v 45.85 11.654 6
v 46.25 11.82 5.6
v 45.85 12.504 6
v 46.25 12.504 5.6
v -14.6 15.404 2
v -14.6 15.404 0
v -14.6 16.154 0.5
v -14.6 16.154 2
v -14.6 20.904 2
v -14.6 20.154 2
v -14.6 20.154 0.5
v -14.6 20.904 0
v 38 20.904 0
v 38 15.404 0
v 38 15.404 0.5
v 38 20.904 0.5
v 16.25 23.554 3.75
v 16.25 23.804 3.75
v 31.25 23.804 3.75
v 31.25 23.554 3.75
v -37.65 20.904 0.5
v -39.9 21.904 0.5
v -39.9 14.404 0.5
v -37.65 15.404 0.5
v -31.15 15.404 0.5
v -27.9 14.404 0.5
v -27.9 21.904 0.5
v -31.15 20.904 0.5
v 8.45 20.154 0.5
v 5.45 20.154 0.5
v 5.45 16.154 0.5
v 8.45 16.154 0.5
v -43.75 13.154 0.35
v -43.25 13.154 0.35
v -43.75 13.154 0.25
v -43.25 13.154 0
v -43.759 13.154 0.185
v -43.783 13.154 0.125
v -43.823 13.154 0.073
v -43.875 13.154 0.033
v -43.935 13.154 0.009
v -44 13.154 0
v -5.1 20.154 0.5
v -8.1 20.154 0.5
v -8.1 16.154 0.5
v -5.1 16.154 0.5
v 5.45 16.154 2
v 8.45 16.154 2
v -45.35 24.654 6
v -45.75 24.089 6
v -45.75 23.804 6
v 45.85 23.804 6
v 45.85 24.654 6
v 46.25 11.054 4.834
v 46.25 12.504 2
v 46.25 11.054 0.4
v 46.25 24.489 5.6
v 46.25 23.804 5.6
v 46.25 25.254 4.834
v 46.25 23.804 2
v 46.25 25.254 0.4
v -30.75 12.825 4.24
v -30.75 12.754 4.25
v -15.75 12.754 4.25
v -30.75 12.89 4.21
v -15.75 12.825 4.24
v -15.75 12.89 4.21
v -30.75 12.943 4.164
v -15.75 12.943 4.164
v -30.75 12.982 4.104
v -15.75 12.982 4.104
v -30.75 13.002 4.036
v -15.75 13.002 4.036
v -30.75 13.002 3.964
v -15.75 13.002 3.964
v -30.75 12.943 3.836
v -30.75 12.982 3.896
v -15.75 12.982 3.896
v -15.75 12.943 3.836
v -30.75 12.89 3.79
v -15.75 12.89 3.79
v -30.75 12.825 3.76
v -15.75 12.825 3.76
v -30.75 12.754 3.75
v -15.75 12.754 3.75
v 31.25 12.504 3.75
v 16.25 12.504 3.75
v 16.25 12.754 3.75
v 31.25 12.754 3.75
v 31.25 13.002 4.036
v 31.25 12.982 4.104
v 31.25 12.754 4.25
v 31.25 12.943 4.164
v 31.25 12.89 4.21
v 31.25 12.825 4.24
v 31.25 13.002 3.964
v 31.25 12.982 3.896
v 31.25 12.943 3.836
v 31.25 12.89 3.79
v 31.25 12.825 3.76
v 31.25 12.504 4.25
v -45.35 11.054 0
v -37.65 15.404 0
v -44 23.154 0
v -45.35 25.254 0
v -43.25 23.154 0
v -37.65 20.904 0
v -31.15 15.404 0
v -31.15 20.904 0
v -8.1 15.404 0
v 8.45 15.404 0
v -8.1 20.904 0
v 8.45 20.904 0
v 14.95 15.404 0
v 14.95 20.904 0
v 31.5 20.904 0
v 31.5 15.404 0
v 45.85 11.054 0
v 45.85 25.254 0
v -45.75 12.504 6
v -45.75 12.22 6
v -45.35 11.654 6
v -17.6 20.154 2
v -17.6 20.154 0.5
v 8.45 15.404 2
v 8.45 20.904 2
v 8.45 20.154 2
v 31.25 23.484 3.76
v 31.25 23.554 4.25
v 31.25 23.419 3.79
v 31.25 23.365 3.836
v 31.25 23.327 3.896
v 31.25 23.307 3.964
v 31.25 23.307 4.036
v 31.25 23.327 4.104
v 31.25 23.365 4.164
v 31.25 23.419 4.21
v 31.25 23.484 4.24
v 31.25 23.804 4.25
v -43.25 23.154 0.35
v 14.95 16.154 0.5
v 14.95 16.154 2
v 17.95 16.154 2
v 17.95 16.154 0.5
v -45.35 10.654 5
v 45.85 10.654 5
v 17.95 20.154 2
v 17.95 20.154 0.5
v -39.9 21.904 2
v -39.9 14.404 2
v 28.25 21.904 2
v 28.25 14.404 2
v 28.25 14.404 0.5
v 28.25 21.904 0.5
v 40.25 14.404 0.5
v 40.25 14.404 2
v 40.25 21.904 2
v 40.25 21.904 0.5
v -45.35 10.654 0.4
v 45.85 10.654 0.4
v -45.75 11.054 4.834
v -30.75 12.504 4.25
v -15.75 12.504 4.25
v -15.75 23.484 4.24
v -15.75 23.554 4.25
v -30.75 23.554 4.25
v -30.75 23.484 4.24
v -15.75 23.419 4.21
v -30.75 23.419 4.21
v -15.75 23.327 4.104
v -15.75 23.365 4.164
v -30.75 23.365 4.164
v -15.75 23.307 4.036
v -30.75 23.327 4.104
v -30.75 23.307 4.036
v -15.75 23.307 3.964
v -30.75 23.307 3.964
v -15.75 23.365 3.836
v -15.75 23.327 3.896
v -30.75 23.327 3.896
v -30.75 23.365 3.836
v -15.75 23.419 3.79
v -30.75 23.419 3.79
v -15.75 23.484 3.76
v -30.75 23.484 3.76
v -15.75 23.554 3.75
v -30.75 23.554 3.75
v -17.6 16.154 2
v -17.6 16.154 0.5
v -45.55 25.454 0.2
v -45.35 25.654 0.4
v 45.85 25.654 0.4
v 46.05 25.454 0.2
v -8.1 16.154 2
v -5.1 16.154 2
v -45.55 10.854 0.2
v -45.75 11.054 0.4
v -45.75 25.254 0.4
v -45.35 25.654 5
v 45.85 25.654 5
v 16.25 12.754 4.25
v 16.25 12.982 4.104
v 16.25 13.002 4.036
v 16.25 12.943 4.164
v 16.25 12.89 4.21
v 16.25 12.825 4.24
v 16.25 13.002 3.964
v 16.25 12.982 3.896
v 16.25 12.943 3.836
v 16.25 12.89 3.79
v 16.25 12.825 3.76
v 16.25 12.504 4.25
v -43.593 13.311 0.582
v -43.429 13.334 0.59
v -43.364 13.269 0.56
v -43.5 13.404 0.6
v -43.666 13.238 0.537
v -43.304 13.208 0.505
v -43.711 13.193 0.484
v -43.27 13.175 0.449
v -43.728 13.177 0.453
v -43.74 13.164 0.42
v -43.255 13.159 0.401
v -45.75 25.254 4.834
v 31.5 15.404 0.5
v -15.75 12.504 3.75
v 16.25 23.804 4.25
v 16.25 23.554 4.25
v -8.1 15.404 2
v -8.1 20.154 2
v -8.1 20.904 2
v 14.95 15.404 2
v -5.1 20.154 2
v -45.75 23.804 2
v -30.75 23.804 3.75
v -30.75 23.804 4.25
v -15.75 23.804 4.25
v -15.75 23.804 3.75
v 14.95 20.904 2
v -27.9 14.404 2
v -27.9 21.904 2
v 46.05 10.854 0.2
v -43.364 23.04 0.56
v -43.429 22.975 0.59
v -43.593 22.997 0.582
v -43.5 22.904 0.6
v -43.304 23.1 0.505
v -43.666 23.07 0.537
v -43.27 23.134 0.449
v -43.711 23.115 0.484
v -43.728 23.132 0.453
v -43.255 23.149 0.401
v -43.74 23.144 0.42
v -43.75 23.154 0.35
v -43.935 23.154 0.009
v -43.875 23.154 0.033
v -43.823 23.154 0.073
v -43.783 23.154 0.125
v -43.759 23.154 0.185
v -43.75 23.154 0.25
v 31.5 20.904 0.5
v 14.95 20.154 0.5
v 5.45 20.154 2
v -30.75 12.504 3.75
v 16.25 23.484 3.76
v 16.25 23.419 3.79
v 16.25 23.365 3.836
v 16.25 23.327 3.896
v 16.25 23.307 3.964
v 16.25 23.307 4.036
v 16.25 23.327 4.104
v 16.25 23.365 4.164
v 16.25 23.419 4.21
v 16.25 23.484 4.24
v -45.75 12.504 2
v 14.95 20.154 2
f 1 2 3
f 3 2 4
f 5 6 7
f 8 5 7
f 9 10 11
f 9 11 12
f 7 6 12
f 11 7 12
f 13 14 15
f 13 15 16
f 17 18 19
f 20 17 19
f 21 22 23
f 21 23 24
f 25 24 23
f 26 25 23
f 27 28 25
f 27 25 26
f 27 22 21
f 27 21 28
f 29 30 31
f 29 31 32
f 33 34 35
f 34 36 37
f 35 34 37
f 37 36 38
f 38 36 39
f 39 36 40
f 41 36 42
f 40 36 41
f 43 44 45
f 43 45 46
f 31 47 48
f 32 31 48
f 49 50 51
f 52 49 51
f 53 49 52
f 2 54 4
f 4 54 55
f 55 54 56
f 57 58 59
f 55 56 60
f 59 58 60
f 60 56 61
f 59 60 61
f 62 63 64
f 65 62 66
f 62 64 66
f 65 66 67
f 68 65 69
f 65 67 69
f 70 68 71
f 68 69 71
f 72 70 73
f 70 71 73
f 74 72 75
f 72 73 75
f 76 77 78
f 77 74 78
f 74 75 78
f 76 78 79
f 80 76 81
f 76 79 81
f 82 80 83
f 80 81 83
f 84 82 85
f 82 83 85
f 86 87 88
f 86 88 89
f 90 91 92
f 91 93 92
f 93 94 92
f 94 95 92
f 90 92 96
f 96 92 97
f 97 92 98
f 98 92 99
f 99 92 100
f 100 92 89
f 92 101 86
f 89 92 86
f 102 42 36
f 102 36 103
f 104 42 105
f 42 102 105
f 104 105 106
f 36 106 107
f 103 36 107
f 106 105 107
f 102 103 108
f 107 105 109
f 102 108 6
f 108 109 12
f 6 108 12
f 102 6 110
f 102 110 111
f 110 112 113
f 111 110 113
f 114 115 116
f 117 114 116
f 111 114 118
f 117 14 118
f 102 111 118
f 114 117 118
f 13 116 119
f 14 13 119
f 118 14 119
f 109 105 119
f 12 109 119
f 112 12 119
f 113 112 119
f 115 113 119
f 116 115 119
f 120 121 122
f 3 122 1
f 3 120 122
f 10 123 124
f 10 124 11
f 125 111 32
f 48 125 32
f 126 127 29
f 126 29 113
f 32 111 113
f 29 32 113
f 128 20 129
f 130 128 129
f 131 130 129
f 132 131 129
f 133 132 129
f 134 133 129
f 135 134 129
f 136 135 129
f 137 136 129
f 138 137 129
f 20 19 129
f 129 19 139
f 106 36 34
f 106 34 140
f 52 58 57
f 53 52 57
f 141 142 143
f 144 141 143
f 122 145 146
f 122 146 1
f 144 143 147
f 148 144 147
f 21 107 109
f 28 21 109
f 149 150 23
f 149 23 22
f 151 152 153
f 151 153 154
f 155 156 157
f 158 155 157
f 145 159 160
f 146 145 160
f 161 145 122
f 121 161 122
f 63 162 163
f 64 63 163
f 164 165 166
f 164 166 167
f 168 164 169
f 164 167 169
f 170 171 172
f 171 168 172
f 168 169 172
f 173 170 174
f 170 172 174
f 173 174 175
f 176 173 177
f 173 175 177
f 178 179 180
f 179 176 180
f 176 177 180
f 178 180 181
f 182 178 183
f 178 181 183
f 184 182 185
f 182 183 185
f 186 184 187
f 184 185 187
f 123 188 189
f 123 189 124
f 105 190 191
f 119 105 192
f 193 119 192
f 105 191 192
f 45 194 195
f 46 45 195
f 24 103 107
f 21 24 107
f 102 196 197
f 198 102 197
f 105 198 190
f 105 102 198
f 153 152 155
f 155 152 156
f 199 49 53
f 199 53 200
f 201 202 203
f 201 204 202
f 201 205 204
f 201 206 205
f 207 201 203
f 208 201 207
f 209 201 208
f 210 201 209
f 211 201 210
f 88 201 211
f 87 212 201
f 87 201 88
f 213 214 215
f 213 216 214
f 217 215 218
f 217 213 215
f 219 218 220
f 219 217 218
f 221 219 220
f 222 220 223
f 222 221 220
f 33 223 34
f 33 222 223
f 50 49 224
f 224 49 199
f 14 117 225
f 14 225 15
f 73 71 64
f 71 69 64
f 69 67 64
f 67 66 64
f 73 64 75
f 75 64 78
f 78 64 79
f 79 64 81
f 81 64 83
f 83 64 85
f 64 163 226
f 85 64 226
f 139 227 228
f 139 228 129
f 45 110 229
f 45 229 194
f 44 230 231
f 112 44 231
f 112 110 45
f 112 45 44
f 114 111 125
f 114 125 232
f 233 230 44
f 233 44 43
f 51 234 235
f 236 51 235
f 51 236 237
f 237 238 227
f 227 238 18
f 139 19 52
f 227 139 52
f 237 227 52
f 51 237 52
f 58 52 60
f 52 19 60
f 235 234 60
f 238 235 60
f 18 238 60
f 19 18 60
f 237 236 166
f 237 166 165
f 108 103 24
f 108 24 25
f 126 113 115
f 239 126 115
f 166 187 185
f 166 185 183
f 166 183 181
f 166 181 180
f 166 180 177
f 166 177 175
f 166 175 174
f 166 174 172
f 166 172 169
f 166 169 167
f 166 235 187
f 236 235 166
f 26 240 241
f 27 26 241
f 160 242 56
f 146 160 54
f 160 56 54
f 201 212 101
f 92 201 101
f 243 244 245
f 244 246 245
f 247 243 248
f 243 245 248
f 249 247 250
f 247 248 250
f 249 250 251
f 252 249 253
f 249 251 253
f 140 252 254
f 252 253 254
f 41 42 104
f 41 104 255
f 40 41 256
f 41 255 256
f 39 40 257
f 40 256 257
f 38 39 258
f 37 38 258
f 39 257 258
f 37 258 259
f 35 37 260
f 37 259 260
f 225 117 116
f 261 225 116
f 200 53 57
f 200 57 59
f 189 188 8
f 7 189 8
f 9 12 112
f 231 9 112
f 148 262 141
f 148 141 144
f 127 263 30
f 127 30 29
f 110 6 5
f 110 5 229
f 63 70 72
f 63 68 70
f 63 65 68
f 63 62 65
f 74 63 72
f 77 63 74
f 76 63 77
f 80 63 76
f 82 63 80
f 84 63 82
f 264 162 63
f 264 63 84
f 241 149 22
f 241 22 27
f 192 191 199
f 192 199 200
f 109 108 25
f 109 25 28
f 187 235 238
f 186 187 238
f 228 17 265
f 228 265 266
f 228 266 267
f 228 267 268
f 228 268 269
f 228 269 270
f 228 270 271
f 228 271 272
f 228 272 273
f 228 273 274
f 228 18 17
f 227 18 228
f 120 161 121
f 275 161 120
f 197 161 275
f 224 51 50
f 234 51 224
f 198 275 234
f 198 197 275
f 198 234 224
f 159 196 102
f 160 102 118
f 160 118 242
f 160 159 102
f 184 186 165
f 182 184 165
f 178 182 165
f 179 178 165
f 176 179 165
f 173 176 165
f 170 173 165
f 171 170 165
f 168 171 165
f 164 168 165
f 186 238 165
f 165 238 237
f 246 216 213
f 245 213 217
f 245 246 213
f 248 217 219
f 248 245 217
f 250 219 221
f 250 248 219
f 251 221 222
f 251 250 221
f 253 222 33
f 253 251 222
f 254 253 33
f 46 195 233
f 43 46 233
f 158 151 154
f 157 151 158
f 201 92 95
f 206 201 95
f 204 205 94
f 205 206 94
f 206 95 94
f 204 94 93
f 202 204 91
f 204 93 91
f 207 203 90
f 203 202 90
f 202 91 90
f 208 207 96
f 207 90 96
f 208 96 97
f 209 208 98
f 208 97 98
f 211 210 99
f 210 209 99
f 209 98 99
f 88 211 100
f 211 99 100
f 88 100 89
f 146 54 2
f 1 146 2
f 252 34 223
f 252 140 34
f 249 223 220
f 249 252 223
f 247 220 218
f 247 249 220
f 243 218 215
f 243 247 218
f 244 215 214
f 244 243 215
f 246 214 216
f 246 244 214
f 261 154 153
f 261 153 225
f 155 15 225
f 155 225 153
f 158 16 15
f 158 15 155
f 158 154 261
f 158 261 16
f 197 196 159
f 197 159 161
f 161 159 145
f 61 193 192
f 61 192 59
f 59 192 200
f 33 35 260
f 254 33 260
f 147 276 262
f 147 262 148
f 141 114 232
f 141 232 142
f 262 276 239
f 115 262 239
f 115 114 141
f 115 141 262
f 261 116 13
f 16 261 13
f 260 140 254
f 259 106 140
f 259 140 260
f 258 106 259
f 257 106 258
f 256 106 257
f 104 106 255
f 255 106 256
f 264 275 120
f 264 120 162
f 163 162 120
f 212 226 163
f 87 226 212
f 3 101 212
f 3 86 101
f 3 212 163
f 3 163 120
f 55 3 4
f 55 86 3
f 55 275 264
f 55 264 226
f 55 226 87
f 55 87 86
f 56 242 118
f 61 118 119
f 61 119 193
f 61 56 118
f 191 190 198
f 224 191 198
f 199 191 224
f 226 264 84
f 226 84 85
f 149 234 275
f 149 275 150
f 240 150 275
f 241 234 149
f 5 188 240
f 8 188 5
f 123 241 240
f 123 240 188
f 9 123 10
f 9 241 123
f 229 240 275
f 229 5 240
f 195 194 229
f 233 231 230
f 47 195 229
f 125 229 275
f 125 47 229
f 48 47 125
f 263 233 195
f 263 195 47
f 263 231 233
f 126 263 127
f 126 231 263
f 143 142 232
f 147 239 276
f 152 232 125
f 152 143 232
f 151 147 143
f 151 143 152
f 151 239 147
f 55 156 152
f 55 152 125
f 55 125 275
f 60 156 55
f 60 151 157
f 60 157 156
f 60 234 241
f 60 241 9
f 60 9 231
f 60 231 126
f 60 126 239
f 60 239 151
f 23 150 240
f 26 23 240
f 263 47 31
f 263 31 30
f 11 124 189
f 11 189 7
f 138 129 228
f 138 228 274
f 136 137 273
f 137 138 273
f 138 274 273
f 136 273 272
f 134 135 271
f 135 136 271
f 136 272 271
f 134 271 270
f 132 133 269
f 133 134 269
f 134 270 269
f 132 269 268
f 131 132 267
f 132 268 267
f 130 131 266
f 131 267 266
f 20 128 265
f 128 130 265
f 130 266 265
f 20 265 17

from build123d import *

# Parameters (mm, degrees)
SKETCH1_W               = 92
SKETCH1_H               = 15
BOSS_EXTRUDE1_DEPTH     = 6
CUT_EXTRUDE1_DEPTH      = 54.227863457
CUT_EXTRUDE1_DEPTH_BACK = 54.227863457
SKETCH2_W               = 6.5
SKETCH2_H               = 5.5
CUT_EXTRUDE2_DEPTH      = 54.227863457
CUT_EXTRUDE2_DEPTH_BACK = 54.227863457
SKETCH3_W               = 6.5
SKETCH3_H               = 5.5
CUT_EXTRUDE3_DEPTH      = 54.227863457
CUT_EXTRUDE3_DEPTH_BACK = 54.227863457
SKETCH4_W               = 6.5
SKETCH4_H               = 5.5
CUT_EXTRUDE4_DEPTH      = 54.227863457
CUT_EXTRUDE4_DEPTH_BACK = 54.227863457
SKETCH5_W               = 6.5
SKETCH5_H               = 5.5
CUT_EXTRUDE5_DEPTH      = 54.227863457
CUT_EXTRUDE5_DEPTH_BACK = 4
SKETCH8_W               = 92
SKETCH8_H               = 11.3
SKETCH9_W               = 12
SKETCH9_H               = 7.5
CUT_EXTRUDE6_DEPTH      = 1.5
SKETCH10_W              = 12.5
SKETCH10_H              = 4
CUT_EXTRUDE7_DEPTH      = 1.5
CUT_EXTRUDE8_DEPTH      = 92
SKETCH13_W              = 0.5
SKETCH13_H              = 10
CUT_EXTRUDE9_DEPTH      = 0.6
FILLET1_R               = 0.25
FILLET2_R               = 0.25
SKETCH16_W              = 15
SKETCH16_H              = 0.5
BOSS_EXTRUDE2_DEPTH     = 0.75
FILLET3_R               = 0.5
FILLET4_R               = 0.25
SKETCH17_W              = 15
SKETCH17_H              = 0.5
BOSS_EXTRUDE3_DEPTH     = 0.75
FILLET5_R               = 0.5
FILLET6_R               = 0.25
LPATTERN1_COUNT         = 2
LPATTERN1_PITCH         = 47
LPATTERN2_COUNT         = 2
LPATTERN2_PITCH         = 47
FILLET7_R               = 0.5
FILLET8_R               = 0.25
FILLET9_R               = 0.5
FILLET10_R              = 0.25
CHAMFER1_SIZE           = 0.4
CHAMFER2_SIZE           = 0.4
CHAMFER3_SIZE           = 0.4
CHAMFER4_SIZE           = 0.4
CHAMFER5_SIZE           = 0.4


# Some blends are built 0.0001 mm under size
with BuildPart() as part:
    # Sketch1 → Boss-Extrude1 (new body)
    with BuildSketch(Plane.XY):
        with Locations((0.25, 18.154296875)):
            Rectangle(SKETCH1_W, SKETCH1_H)
    extrude(amount=BOSS_EXTRUDE1_DEPTH)

    # Sketch2 → Cut-Extrude1 (cut, two sides: drawn at the far end of the back side and taken through both)
    with BuildSketch(Plane.XY.offset(6).offset(-CUT_EXTRUDE1_DEPTH_BACK)):
        with Locations((-34.4, 18.154296875)):
            Rectangle(SKETCH2_W, SKETCH2_H)
    extrude(amount=CUT_EXTRUDE1_DEPTH + CUT_EXTRUDE1_DEPTH_BACK, mode=Mode.SUBTRACT)

    # Sketch3 → Cut-Extrude2 (cut, two sides: drawn at the far end of the back side and taken through both)
    with BuildSketch(Plane.XY.offset(6).offset(-CUT_EXTRUDE2_DEPTH_BACK)):
        with Locations((-11.35, 18.154296875)):
            Rectangle(SKETCH3_W, SKETCH3_H)
    extrude(amount=CUT_EXTRUDE2_DEPTH + CUT_EXTRUDE2_DEPTH_BACK, mode=Mode.SUBTRACT)

    # Sketch4 → Cut-Extrude3 (cut, two sides: drawn at the far end of the back side and taken through both)
    with BuildSketch(Plane.XY.offset(6).offset(-CUT_EXTRUDE3_DEPTH_BACK)):
        with Locations((11.7, 18.154296875)):
            Rectangle(SKETCH4_W, SKETCH4_H)
    extrude(amount=CUT_EXTRUDE3_DEPTH + CUT_EXTRUDE3_DEPTH_BACK, mode=Mode.SUBTRACT)

    # Sketch5 → Cut-Extrude4 (cut, two sides: drawn at the far end of the back side and taken through both)
    with BuildSketch(Plane.XY.offset(6).offset(-CUT_EXTRUDE4_DEPTH_BACK)):
        with Locations((34.75, 18.154296875)):
            Rectangle(SKETCH5_W, SKETCH5_H)
    extrude(amount=CUT_EXTRUDE4_DEPTH + CUT_EXTRUDE4_DEPTH_BACK, mode=Mode.SUBTRACT)

    # Sketch8 → Cut-Extrude5 (cut, two sides: drawn at the far end of the back side and taken through both)
    with BuildSketch(Plane.XY.offset(6).offset(-CUT_EXTRUDE5_DEPTH_BACK)):
        with Locations((0.25, 18.154296875)):
            Rectangle(SKETCH8_W, SKETCH8_H)
    extrude(amount=CUT_EXTRUDE5_DEPTH + CUT_EXTRUDE5_DEPTH_BACK, mode=Mode.SUBTRACT)

    # Sketch9 → Cut-Extrude6 (cut)
    with BuildSketch(Plane.XY.offset(2)):
        with Locations((34.25, 18.154296875)):
            Rectangle(SKETCH9_W, SKETCH9_H)
        with Locations((-33.9, 18.154296875)):
            Rectangle(SKETCH9_W, SKETCH9_H)
    extrude(amount=-CUT_EXTRUDE6_DEPTH, mode=Mode.SUBTRACT)

    # Sketch10 → Cut-Extrude7 (cut)
    with BuildSketch(Plane.XY.offset(2)):
        with Locations((11.7, 18.154296875)):
            Rectangle(SKETCH10_W, SKETCH10_H)
        with Locations((-11.35, 18.154296875)):
            Rectangle(SKETCH10_W, SKETCH10_H)
    extrude(amount=-CUT_EXTRUDE7_DEPTH, mode=Mode.SUBTRACT)

    # Sketch12 → Cut-Extrude8 (cut)
    with BuildSketch(Plane(origin=(46.25, 0, 0), x_dir=(0, 0, -1), z_dir=(1, 0, 0))):
        Polygon((-6, 25.654296875), (-6, 24.654296875), (-5, 25.654296875), align=None)
        Polygon((-6, 10.654296875), (-5, 10.654296875), (-6, 11.654296875), align=None)
    extrude(amount=-CUT_EXTRUDE8_DEPTH, mode=Mode.SUBTRACT)

    # Sketch13 → Cut-Extrude9 (cut)
    with BuildSketch(Plane(origin=(0, 0, 0), x_dir=(-1, 0, 0), z_dir=(0, 0, -1))):
        with Locations((43.5, 18.154296875)):
            Rectangle(SKETCH13_W, SKETCH13_H)
    extrude(amount=-CUT_EXTRUDE9_DEPTH, mode=Mode.SUBTRACT)

    # Fillet1
    fillet1_edges = [part.edges().sort_by_distance(p)[0] for p in [
        (-43.75, 18.154296875, 0),
    ]]
    fillet(fillet1_edges, radius=FILLET1_R)

    # Fillet2
    fillet2_edges = [part.edges().sort_by_distance(p)[0] for p in [
        (-43.25, 18.154296875, 0.6),
        (-43.5, 23.154296875, 0.6),
        (-43.75, 18.154296875, 0.6),
        (-43.5, 13.154296875, 0.6),
    ]]
    fillet(fillet2_edges, radius=FILLET2_R - 0.0001)  # a hair under: the kernel refuses the full size

    # Sketch16 → Boss-Extrude2 (add)
    with BuildSketch(Plane.XZ.offset(-23.804296875)):
        with Locations((-23.25, 4)):
            Rectangle(SKETCH16_W, SKETCH16_H)
    boss_extrude2 = extrude(amount=BOSS_EXTRUDE2_DEPTH)

    # Fillet3
    fillet3_edges = [part.edges().sort_by_distance(p)[0] for p in [
        (-23.25, 23.054296875, 4.25),
    ]]
    fillet(fillet3_edges, radius=FILLET3_R - 0.0001)  # a hair under: the kernel refuses the full size

    # Fillet4
    # the kernel refuses this fillet: 0.25 mm, written as the material it takes off along each edge
    with BuildSketch(Plane(origin=(-32.517583767, 23.054296875, 3.75), x_dir=(0, 0.707033489959235, 0.7071800648180521), z_dir=(1, 0, 0))) as fillet4_piece_1:
        with BuildLine():
            CenterArc((0.530239774, -0.176759657), FILLET4_R, 44.994478066, 179.999583566)
            Line((0.353444757, -0.35351803), (0.335765256, -0.371193867))
            Line((0.335765256, -0.371193867), (-0.017679502, -0.017675837))
            Line((-0.017679502, -0.017675837), (-0.017675837, 0.017679502))
            ThreePointArc((-0.017675837, 0.017679502), (-0.017605119, 0.017750205), (0.724712878, 0.017675966))
            Line((0.724712878, 0.017675966), (0.707033505, 0))
        make_face()
    extrude(amount=18.535167534, mode=Mode.SUBTRACT)

    # Sketch17 → Boss-Extrude3 (add)
    with BuildSketch(Plane(origin=(0, 12.504296875, 0), x_dir=(1, 0, 0), z_dir=(0, 1, 0))):
        with Locations((-23.25, -4)):
            Rectangle(SKETCH17_W, SKETCH17_H)
    boss_extrude3 = extrude(amount=BOSS_EXTRUDE3_DEPTH)

    # Fillet5
    fillet5_edges = [part.edges().sort_by_distance(p)[0] for p in [
        (-23.25, 13.254296875, 4.25),
    ]]
    fillet(fillet5_edges, radius=FILLET5_R - 0.0001)  # a hair under: the kernel refuses the full size

    # Fillet6
    # the kernel refuses this fillet: 0.25 mm, written as the material it takes off along each edge
    with BuildSketch(Plane(origin=(-13.982416233, 13.254296875, 3.75), x_dir=(0, -0.7070334915471351, 0.7071800632304811), z_dir=(-1, 0, 0))) as fillet6_piece_1:
        with BuildLine():
            CenterArc((0.530239775, -0.176759657), FILLET6_R, 44.994477938, 179.999583823)
            Line((0.353444759, -0.35351803), (0.335765257, -0.371193867))
            Line((0.335765257, -0.371193867), (-0.017679502, -0.017675837))
            Line((-0.017679502, -0.017675837), (-0.017675837, 0.017679502))
            ThreePointArc((-0.017675837, 0.017679502), (-0.017605119, 0.017750205), (0.72471288, 0.017675966))
            Line((0.72471288, 0.017675966), (0.707033507, 0))
        make_face()
    extrude(amount=18.535167534, mode=Mode.SUBTRACT)

    # LPattern1: Boss-Extrude3 ×2
    with Locations(*[(i * LPATTERN1_PITCH, 0, 0) for i in range(1, LPATTERN1_COUNT)]):
        add(boss_extrude3)

    # LPattern2: Boss-Extrude2 ×2
    with Locations(*[(i * LPATTERN2_PITCH, 0, 0) for i in range(1, LPATTERN2_COUNT)]):
        add(boss_extrude2)

    # Fillet7
    fillet7_edges = [part.edges().sort_by_distance(p)[0] for p in [
        (23.75, 23.054296875, 4.25),
    ]]
    fillet(fillet7_edges, radius=FILLET7_R - 0.0001)  # a hair under: the kernel refuses the full size

    # Fillet8
    # the kernel refuses this fillet: 0.25 mm, written as the material it takes off along each edge
    with BuildSketch(Plane(origin=(14.482416233, 23.054296875, 3.75), x_dir=(0, 0.707033489959235, 0.7071800648180521), z_dir=(1, 0, 0))) as fillet8_piece_1:
        with BuildLine():
            CenterArc((0.530239774, -0.176759657), FILLET8_R, 44.994478066, 179.999583566)
            Line((0.353444757, -0.35351803), (0.335765256, -0.371193867))
            Line((0.335765256, -0.371193867), (-0.017679502, -0.017675837))
            Line((-0.017679502, -0.017675837), (-0.017675837, 0.017679502))
            ThreePointArc((-0.017675837, 0.017679502), (-0.017605119, 0.017750205), (0.724712878, 0.017675966))
            Line((0.724712878, 0.017675966), (0.707033505, 0))
        make_face()
    extrude(amount=18.535167534, mode=Mode.SUBTRACT)

    # Fillet9
    fillet9_edges = [part.edges().sort_by_distance(p)[0] for p in [
        (23.75, 13.254296875, 4.25),
    ]]
    fillet(fillet9_edges, radius=FILLET9_R - 0.0001)  # a hair under: the kernel refuses the full size

    # Fillet10
    # the kernel refuses this fillet: 0.25 mm, written as the material it takes off along each edge
    with BuildSketch(Plane(origin=(33.017583767, 13.254296875, 3.75), x_dir=(0, -0.7070334947010828, 0.707180060077187), z_dir=(-1, 0, 0))) as fillet10_piece_1:
        with BuildLine():
            CenterArc((0.530239777, -0.176759656), FILLET10_R, 44.994477682, 179.999584334)
            Line((0.353444762, -0.35351803), (0.335765261, -0.371193867))
            Line((0.335765261, -0.371193867), (-0.017679502, -0.017675837))
            Line((-0.017679502, -0.017675837), (-0.017675837, 0.017679502))
            ThreePointArc((-0.017675837, 0.017679502), (-0.017605119, 0.017750205), (0.724712883, 0.017675966))
            Line((0.724712883, 0.017675966), (0.70703351, 0))
        make_face()
    extrude(amount=18.535167534, mode=Mode.SUBTRACT)

    # Chamfer1
    chamfer1_edges = [part.edges().sort_by_distance(p)[0] for p in [
        (0.25, 25.654296875, 0),
        (0.25, 10.654296875, 0),
    ]]
    chamfer(chamfer1_edges, length=CHAMFER1_SIZE)

    # Chamfer2
    chamfer2_edges = [part.edges().sort_by_distance(p)[0] for p in [
        (46.25, 18.154296875, 0),
        (-45.75, 18.154296875, 0),
    ]]
    chamfer(chamfer2_edges, length=CHAMFER2_SIZE)

    # Chamfer3
    chamfer3_edges = [part.edges().sort_by_distance(p)[0] for p in [
        (-45.75, 25.654296875, 2.7),
        (-45.75, 10.654296875, 2.7),
    ]]
    chamfer(chamfer3_edges, length=CHAMFER3_SIZE)

    # Chamfer4
    chamfer4_edges = [part.edges().sort_by_distance(p)[0] for p in [
        (-45.75, 11.354296875, 5.7),
        (-45.75, 24.954296875, 5.7),
    ]]
    chamfer(chamfer4_edges, length=CHAMFER4_SIZE)

    # Chamfer5
    chamfer5_edges = [part.edges().sort_by_distance(p)[0] for p in [
        (46.25, 24.229296875, 6),
        (46.25, 25.654296875, 2.7),
        (46.25, 10.654296875, 2.7),
        (46.25, 12.079296875, 6),
        (46.25, 25.154296875, 5.5),
        (46.25, 11.154296875, 5.5),
    ]]
    chamfer(chamfer5_edges, length=CHAMFER5_SIZE)


solid = part.part
